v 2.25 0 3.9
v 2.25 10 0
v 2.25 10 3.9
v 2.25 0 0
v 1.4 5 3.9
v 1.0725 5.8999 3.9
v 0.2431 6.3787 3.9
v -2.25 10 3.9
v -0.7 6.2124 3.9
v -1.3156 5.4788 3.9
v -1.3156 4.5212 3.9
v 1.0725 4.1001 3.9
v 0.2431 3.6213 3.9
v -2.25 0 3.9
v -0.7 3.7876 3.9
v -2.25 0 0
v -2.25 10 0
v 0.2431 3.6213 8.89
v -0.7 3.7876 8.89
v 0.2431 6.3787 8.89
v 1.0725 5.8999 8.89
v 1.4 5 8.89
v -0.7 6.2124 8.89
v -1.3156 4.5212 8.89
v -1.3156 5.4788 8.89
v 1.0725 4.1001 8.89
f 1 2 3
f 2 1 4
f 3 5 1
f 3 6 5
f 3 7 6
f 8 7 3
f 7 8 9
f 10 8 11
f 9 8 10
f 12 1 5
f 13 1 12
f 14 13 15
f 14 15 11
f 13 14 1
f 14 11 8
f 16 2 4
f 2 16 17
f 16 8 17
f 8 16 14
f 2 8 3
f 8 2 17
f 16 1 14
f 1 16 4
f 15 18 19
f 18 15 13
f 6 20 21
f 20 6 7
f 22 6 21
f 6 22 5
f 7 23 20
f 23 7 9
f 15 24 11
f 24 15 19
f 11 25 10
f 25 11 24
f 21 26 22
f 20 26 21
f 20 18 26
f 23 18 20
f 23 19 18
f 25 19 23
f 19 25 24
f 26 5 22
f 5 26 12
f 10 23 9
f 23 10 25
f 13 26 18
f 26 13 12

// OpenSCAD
// -*- mode: SCAD ; c-file-style: "ellemtel" ; coding: utf-8 -*-
//
// NN
//
// © 2018–2022 Roland Sieker <ospalh@gmail.com>
// Licence: CC-BY-SA 4.0

/* [Global] */


// Set this to “render” and click on “Create Thing” when done with the setup.
preview = 1; // [0:render, 1:preview]

/* [Sizes] */

// distance from slat
a = 3.6;  // [1:0.1:40]

// diameter
d = 2.8;  // [1:0.1:40]

// hight of block
h = 3.9;  // [1:0.1:40]

// depth
t = 4.5;  // [1:0.1:40]

// width
w = 10;  // [1:0.1:40]

// length
l = 5;  // [1:0.1:40]



/* [Hidden] */

// Done with the customizer

// *******************************************************
// Extra parameters. These can be changed reasonably safely.


// w = 1.8;  // Wall width
p = 1.2;  // Bottom, top plate hight
c = 0.4;  // Clearance
angle = 60; // Overhangs much below 60° are a problem for me


// *******************************************************
// Some shortcuts. These shouldn’t be changed


module kmirror(maxis=[1, 0, 0])
{
   // Keep *and* mirror an object. Standard is left and right mirroring.
   children();
   mirror(maxis)
   {
      children();
   }
}

tau = 2 * PI;  // π is still wrong. τ = circumference / r

xy_factor = 1/tan(angle);
// To get from a hight to a horizontal width inclined correctly
z_factor = tan(angle);  // The other way around


some_distance = 50;
ms = 0.01;  // Muggeseggele.

// fn for differently sized objects and fs, fa; all for preview or rendering.
pna = 40;
pnb = 15;
pa = 5;
ps = 1;
rna = 180;
rnb = 30;
ra = 2;
rs = 0.25;
function na() = (preview) ? pna : rna;
function nb() = (preview) ? pnb : rnb;
$fs = (preview) ? ps : rs;
$fa = (preview) ? pa : ra;

// *******************************************************
// End setup


r = d/2;
cp = a + r;

// … to preview. You will get all parts as separate STLs when you click “Create Thing”.
part = "k"; // [s: Set, a: Part A, b: Part B]


// *******************************************************
// Generate the parts

print_part();


if ("s" == part)
{
   preview_parts();
}

if ("st" == part)
{
   // Use "st" during development
   stack_parts();
}

module print_part()
{
   if ("k" == part)
   {
      kettending();
   }
}

module preview_parts()
{
   kettending();
}

module stack_parts()
{
   // intersection()
   {
      color("yellow")
      {
         part_a();
      }
      translate([0,0,30])
      {
         color("red")
         {
            part_b();
         }
      }
   }
}

// *******************************************************
// Code for the parts themselves


module kettending()
{
   translate([-t/2, 0, 0])
   {
      cube([t,w,h]);
   }
   translate([0, a+r, h-ms])
   {
      cylinder(r=r, h=l);
   }
}
